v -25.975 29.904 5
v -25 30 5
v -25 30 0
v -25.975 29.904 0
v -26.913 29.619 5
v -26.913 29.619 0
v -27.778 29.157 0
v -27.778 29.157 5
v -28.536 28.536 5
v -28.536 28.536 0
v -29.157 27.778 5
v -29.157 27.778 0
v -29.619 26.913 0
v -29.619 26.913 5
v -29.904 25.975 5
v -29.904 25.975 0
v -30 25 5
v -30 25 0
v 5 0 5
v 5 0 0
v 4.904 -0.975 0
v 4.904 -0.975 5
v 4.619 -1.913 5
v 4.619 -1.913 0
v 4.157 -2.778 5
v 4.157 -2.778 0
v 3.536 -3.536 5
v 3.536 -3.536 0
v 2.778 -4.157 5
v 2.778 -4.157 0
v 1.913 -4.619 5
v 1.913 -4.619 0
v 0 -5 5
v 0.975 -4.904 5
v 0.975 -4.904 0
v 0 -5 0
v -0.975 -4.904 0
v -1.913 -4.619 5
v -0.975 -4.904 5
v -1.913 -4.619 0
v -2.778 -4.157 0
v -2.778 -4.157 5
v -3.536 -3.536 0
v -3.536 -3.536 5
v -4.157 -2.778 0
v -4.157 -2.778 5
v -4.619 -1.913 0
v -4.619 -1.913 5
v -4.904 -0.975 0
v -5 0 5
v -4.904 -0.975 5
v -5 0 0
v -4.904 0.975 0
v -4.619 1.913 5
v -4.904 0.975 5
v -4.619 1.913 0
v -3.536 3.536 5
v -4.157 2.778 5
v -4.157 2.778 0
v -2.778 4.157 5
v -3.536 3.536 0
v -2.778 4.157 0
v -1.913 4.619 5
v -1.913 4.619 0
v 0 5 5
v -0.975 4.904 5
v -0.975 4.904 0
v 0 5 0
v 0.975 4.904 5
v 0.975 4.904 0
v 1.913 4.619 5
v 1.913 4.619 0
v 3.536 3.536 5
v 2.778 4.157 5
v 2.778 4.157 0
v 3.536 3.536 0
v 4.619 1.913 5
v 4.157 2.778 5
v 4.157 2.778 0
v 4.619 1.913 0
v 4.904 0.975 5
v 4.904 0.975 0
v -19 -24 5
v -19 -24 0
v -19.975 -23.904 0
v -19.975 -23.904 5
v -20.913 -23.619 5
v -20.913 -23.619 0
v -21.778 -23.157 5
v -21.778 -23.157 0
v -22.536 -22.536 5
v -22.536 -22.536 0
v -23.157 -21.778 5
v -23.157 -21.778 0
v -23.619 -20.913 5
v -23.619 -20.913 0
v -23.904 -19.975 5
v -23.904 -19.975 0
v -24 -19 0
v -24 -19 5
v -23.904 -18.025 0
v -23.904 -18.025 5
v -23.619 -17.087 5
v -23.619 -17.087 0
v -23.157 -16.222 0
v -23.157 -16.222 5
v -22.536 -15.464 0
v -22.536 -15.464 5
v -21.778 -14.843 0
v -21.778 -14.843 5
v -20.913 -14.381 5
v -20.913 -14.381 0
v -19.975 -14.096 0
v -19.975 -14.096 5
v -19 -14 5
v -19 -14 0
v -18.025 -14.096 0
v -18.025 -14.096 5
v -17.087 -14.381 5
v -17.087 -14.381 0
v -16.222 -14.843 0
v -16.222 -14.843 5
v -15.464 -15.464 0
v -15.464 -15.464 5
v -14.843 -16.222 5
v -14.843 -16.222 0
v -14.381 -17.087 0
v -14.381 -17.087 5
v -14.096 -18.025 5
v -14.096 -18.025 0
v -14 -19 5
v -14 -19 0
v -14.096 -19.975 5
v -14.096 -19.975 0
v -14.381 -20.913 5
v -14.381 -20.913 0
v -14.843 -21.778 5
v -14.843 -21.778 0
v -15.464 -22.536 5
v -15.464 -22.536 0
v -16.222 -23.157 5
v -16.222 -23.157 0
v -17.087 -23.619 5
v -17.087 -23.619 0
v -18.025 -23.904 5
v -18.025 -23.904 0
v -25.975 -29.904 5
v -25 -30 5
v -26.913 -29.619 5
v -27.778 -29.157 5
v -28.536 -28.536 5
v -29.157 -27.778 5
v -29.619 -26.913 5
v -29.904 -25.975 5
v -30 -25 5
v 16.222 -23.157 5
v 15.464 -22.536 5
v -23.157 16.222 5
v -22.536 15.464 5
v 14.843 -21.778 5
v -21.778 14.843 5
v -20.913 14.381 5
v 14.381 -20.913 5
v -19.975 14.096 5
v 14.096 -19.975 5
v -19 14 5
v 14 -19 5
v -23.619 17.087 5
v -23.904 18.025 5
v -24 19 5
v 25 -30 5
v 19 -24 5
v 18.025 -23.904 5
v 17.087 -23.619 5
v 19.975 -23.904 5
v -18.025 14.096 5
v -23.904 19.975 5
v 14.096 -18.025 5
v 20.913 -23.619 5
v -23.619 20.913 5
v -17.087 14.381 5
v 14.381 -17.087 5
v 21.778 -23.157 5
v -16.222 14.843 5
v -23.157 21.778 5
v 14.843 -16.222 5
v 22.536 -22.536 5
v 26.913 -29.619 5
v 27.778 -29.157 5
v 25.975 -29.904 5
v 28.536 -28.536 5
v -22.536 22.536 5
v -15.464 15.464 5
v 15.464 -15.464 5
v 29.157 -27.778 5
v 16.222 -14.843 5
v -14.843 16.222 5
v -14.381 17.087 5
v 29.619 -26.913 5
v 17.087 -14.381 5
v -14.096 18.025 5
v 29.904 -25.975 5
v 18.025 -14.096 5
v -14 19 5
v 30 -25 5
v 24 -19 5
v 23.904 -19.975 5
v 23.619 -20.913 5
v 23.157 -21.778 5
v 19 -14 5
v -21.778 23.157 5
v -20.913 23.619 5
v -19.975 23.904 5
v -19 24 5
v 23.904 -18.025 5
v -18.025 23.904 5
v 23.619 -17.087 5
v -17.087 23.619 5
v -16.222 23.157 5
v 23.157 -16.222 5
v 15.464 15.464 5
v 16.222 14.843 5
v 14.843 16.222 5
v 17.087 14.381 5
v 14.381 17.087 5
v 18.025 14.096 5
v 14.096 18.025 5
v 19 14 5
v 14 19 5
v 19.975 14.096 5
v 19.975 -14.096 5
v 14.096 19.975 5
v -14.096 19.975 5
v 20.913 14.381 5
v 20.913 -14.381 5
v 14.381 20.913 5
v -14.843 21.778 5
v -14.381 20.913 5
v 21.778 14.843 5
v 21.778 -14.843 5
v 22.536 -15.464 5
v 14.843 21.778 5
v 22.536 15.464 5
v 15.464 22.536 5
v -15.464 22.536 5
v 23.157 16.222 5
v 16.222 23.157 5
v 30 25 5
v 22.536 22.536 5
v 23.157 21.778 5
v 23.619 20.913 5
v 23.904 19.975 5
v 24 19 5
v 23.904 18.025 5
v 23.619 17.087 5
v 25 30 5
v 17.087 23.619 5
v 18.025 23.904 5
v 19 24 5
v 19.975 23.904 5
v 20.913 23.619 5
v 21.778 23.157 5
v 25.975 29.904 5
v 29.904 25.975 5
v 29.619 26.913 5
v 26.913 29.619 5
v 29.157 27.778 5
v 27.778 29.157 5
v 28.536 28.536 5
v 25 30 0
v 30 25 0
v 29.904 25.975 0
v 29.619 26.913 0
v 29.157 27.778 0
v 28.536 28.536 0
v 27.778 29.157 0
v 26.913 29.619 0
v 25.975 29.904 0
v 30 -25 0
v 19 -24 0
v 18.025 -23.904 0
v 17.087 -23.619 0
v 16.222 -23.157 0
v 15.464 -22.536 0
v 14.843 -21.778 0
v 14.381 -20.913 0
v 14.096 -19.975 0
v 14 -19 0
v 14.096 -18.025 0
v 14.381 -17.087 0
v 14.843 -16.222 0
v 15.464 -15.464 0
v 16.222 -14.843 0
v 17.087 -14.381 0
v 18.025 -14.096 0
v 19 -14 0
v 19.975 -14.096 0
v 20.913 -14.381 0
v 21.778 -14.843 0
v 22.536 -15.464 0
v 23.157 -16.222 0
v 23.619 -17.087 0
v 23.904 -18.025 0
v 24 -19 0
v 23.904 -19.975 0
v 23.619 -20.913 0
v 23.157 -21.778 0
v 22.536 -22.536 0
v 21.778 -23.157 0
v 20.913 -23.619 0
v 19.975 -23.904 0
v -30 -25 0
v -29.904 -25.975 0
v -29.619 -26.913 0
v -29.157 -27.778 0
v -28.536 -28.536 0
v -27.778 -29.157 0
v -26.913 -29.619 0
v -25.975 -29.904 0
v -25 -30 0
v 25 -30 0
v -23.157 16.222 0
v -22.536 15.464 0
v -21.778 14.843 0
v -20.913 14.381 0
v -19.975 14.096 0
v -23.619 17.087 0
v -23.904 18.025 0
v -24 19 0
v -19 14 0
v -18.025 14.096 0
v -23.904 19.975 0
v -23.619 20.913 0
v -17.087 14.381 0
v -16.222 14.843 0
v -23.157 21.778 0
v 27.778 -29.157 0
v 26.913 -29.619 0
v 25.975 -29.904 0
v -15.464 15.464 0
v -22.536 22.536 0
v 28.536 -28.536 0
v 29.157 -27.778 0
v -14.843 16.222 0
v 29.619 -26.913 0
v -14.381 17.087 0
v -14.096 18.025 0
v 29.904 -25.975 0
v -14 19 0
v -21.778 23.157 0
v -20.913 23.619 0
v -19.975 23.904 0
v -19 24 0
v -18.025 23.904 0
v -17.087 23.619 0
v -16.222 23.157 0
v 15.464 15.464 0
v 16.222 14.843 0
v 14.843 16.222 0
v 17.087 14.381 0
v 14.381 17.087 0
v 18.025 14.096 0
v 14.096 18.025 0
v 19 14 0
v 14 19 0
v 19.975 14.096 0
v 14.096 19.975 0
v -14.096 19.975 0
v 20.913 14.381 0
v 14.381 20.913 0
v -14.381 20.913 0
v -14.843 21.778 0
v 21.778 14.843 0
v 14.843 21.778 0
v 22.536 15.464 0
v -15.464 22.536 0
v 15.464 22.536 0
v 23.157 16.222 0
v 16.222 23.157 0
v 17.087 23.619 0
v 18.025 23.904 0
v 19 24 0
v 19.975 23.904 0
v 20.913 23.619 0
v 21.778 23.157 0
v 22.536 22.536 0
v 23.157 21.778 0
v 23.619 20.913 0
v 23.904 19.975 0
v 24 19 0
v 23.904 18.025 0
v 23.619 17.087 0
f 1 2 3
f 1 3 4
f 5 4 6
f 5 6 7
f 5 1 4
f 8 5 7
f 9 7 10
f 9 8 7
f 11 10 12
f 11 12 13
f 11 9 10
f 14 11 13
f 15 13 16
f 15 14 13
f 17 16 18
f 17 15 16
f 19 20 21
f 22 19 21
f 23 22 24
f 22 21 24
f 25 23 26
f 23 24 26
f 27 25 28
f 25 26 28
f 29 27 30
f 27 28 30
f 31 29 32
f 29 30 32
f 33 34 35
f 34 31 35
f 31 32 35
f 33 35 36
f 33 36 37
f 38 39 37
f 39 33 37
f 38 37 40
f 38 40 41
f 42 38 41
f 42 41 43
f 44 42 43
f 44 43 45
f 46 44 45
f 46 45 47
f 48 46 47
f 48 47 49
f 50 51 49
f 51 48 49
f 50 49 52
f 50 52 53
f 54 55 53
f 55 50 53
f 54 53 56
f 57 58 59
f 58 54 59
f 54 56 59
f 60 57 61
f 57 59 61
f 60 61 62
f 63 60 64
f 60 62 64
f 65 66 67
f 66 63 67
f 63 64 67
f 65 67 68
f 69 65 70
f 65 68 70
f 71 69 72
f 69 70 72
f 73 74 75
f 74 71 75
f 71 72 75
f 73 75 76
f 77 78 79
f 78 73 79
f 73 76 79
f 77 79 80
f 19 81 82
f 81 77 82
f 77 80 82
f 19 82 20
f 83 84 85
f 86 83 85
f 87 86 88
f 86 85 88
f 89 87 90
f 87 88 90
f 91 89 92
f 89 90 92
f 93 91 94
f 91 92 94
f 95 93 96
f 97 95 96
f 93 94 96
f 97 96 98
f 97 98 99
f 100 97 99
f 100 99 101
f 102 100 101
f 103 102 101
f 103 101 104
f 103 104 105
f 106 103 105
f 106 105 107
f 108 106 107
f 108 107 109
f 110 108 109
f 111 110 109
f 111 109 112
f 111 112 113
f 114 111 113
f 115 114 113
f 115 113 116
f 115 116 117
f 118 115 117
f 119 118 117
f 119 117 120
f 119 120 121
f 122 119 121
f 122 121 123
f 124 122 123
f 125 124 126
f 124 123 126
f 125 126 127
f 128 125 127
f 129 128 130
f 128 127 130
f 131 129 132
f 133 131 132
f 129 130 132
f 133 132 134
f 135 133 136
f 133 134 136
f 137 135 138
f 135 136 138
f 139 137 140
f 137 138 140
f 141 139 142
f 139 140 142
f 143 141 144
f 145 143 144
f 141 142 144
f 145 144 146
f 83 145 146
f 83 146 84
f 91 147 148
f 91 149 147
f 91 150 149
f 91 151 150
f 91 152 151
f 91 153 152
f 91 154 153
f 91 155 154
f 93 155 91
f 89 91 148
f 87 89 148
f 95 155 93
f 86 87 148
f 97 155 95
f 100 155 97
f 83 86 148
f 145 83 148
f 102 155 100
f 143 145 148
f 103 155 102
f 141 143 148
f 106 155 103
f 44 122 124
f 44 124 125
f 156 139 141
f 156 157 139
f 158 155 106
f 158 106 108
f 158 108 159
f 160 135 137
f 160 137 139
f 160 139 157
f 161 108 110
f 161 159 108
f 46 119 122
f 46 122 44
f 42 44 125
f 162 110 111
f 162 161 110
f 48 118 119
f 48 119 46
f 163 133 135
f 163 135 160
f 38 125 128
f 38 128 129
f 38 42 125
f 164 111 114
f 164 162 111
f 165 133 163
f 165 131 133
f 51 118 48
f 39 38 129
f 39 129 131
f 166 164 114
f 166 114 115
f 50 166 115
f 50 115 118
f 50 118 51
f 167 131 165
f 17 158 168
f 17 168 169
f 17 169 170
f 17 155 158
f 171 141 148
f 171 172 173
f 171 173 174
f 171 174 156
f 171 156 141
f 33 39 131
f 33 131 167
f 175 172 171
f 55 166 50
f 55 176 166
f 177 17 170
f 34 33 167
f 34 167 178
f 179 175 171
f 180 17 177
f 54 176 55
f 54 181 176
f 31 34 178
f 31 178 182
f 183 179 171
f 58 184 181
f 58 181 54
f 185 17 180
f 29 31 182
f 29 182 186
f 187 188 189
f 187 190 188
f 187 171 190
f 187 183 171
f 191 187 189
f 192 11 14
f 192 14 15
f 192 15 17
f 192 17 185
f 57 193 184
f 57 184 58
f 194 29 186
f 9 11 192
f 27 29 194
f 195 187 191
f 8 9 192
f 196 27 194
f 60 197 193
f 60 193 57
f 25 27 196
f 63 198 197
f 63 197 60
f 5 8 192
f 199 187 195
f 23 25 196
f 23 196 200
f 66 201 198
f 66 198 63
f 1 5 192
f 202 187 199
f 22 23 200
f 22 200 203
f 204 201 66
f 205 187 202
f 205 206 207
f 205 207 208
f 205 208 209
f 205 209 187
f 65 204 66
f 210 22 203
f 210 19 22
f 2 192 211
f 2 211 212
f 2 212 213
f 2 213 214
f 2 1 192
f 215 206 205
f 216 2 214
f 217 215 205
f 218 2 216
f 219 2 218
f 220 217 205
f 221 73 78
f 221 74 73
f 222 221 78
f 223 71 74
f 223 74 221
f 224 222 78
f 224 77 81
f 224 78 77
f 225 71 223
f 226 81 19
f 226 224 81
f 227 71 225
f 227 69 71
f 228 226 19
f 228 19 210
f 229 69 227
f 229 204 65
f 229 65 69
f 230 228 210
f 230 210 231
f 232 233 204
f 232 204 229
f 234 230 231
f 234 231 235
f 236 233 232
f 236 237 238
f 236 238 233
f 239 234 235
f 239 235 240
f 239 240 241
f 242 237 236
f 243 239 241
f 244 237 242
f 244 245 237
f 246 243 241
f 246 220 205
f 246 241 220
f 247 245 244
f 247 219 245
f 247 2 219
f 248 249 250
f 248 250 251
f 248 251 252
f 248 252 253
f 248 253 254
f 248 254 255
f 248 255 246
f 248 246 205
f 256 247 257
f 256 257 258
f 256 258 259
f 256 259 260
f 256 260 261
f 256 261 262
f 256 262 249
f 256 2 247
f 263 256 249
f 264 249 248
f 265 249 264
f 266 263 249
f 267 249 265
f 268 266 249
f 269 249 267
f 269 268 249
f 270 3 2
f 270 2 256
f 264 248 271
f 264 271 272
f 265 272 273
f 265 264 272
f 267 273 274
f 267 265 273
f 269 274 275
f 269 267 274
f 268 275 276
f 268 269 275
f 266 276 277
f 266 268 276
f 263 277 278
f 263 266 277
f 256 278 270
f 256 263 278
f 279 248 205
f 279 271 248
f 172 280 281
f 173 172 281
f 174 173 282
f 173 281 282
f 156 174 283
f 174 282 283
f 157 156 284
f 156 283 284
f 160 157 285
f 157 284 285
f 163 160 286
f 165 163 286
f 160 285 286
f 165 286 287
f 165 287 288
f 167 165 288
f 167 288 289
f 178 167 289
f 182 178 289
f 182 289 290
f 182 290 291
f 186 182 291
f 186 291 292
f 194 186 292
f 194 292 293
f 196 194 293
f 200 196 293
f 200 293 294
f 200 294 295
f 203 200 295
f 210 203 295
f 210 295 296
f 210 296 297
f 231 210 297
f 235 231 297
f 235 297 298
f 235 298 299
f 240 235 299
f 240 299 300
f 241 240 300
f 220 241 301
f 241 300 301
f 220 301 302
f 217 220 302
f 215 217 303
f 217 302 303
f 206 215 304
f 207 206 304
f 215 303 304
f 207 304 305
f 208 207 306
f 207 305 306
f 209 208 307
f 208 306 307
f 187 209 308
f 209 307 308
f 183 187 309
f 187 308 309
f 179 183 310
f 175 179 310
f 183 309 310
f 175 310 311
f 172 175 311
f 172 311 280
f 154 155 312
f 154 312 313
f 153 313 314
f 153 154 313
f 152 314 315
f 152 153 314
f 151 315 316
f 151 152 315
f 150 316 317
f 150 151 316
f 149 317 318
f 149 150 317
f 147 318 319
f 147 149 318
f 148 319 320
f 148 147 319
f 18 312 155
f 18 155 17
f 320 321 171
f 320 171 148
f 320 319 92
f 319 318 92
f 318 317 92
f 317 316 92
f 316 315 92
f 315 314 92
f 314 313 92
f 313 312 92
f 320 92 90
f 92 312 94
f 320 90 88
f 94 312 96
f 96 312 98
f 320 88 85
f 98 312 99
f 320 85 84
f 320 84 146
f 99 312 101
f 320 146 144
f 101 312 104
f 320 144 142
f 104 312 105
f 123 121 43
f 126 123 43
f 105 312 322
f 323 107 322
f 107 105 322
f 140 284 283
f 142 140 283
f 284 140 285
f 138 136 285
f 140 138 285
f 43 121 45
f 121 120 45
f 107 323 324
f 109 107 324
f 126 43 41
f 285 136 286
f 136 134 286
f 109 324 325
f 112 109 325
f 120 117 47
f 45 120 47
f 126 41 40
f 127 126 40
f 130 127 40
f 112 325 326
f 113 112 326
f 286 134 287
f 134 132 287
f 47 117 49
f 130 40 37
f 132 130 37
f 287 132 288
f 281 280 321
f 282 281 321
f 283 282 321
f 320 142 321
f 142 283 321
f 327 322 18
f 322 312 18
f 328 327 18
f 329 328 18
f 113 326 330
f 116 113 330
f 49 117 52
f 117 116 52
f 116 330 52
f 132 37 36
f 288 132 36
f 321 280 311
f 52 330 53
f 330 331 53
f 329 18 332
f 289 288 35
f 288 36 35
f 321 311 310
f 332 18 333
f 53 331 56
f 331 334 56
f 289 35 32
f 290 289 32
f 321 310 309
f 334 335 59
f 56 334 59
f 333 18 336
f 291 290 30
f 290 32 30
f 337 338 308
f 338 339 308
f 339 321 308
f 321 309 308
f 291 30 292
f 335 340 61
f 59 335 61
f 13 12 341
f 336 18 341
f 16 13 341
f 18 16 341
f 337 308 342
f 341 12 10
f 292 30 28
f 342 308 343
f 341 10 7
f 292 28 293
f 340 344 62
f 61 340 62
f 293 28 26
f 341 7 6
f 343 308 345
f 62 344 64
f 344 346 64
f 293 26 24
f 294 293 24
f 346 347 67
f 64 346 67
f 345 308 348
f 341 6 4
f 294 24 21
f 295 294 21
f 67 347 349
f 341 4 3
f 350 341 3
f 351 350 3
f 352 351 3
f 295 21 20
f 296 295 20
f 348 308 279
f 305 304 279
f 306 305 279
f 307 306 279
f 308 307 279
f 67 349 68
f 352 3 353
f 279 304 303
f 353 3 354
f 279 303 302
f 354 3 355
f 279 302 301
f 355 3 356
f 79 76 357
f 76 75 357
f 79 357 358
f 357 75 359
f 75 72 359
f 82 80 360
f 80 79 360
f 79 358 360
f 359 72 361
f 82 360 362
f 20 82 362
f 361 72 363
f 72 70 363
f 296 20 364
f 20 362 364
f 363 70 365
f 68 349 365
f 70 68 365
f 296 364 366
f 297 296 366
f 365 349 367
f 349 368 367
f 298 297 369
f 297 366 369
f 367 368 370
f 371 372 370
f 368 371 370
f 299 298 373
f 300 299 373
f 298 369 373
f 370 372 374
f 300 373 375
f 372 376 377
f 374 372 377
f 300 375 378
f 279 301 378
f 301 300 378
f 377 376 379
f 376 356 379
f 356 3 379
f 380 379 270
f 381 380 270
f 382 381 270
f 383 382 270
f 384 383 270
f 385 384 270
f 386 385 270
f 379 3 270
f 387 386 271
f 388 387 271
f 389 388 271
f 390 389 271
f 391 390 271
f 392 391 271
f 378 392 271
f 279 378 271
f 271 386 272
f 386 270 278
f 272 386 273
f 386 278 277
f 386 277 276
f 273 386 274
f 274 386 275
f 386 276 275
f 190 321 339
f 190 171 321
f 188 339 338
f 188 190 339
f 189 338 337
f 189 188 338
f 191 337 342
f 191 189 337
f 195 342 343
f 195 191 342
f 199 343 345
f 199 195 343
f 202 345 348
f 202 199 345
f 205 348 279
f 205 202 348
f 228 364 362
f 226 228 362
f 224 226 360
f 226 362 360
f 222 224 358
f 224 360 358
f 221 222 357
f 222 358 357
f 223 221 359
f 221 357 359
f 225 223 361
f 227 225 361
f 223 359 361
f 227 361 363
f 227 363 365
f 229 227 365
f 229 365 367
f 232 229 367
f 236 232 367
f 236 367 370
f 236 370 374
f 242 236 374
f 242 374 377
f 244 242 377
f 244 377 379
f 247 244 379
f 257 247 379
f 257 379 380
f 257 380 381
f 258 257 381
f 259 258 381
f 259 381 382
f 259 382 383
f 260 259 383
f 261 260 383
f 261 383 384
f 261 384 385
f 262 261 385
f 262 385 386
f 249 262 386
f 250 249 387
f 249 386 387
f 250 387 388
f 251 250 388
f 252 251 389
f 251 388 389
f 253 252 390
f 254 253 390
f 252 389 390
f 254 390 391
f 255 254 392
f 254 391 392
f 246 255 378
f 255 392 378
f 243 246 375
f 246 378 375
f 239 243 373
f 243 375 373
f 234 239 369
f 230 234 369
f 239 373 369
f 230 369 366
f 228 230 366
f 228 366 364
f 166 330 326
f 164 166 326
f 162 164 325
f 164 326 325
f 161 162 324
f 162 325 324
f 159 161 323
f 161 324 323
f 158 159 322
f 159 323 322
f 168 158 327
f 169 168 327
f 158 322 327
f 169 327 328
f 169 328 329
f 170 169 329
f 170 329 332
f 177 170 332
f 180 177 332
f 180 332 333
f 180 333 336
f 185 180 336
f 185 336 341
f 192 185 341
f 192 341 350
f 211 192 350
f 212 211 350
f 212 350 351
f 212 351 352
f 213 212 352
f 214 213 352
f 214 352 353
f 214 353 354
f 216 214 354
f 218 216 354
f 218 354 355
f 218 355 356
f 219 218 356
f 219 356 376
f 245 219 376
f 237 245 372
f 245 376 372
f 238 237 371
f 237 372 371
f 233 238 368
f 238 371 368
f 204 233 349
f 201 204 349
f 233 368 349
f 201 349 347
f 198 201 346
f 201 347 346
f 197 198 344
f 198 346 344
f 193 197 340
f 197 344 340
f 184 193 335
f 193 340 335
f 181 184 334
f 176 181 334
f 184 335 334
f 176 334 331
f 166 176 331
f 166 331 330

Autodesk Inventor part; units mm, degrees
ref_plane "YZ Plane" through (0, 0, 0) normal (1, 0, 0) x (0, 1, 0)
ref_plane "XZ Plane" through (0, 0, 0) normal (0, 1, 0) x (-1, 0, 0)
ref_plane "XY Plane" through (0, 0, 0) normal (0, 0, 1) x (1, 0, 0)
sketch "Schizzo1" plane through (0, 0, 0) normal (0, 0, 1) x (1, 0, 0)
  line L0 (-30, 30) -> (30, 30)
  line L1 (30, 30) -> (30, -30)
  line L2 (30, -30) -> (-30, -30)
  line L3 (-30, -30) -> (-30, 30)
  line L4 (-30, 30) -> (30, -30) construction
  line L5 (30, 30) -> (-30, -30) construction
  circle A0 centre (0, 0) radius 5
  dimension "d0" = 60
  dimension "d1" = 60
  dimension "d5" = 10
extrude "Estrusione2" add sketch "Schizzo1" along normal blind 5
fillet "Raccordo2" radius 5 4 edges at (-30, 30, 2.5) (30, 30, 2.5) (30, -30, 2.5) (-30, -30, 2.5)
sketch "Schizzo3" plane through (0, 0, 5) normal (0, 0, 1) x (1, 0, 0)
  circle A0 centre (19, -19) radius 6.4 projected
  circle A1 centre (-19, -19) radius 4.5 projected
  circle A2 centre (19, 19) radius 4.5 projected
  circle A3 centre (-19, 19) radius 3 projected
  point P0 (0, 0)
hole "Foro1" at (19, -19, 5) at (19, 19, 5) at (-19, 19, 5) at (-19, -19, 5) direction (0, 0, -1) diameter 10 end through all
properties part number "Piastra supporto pistone lama"
